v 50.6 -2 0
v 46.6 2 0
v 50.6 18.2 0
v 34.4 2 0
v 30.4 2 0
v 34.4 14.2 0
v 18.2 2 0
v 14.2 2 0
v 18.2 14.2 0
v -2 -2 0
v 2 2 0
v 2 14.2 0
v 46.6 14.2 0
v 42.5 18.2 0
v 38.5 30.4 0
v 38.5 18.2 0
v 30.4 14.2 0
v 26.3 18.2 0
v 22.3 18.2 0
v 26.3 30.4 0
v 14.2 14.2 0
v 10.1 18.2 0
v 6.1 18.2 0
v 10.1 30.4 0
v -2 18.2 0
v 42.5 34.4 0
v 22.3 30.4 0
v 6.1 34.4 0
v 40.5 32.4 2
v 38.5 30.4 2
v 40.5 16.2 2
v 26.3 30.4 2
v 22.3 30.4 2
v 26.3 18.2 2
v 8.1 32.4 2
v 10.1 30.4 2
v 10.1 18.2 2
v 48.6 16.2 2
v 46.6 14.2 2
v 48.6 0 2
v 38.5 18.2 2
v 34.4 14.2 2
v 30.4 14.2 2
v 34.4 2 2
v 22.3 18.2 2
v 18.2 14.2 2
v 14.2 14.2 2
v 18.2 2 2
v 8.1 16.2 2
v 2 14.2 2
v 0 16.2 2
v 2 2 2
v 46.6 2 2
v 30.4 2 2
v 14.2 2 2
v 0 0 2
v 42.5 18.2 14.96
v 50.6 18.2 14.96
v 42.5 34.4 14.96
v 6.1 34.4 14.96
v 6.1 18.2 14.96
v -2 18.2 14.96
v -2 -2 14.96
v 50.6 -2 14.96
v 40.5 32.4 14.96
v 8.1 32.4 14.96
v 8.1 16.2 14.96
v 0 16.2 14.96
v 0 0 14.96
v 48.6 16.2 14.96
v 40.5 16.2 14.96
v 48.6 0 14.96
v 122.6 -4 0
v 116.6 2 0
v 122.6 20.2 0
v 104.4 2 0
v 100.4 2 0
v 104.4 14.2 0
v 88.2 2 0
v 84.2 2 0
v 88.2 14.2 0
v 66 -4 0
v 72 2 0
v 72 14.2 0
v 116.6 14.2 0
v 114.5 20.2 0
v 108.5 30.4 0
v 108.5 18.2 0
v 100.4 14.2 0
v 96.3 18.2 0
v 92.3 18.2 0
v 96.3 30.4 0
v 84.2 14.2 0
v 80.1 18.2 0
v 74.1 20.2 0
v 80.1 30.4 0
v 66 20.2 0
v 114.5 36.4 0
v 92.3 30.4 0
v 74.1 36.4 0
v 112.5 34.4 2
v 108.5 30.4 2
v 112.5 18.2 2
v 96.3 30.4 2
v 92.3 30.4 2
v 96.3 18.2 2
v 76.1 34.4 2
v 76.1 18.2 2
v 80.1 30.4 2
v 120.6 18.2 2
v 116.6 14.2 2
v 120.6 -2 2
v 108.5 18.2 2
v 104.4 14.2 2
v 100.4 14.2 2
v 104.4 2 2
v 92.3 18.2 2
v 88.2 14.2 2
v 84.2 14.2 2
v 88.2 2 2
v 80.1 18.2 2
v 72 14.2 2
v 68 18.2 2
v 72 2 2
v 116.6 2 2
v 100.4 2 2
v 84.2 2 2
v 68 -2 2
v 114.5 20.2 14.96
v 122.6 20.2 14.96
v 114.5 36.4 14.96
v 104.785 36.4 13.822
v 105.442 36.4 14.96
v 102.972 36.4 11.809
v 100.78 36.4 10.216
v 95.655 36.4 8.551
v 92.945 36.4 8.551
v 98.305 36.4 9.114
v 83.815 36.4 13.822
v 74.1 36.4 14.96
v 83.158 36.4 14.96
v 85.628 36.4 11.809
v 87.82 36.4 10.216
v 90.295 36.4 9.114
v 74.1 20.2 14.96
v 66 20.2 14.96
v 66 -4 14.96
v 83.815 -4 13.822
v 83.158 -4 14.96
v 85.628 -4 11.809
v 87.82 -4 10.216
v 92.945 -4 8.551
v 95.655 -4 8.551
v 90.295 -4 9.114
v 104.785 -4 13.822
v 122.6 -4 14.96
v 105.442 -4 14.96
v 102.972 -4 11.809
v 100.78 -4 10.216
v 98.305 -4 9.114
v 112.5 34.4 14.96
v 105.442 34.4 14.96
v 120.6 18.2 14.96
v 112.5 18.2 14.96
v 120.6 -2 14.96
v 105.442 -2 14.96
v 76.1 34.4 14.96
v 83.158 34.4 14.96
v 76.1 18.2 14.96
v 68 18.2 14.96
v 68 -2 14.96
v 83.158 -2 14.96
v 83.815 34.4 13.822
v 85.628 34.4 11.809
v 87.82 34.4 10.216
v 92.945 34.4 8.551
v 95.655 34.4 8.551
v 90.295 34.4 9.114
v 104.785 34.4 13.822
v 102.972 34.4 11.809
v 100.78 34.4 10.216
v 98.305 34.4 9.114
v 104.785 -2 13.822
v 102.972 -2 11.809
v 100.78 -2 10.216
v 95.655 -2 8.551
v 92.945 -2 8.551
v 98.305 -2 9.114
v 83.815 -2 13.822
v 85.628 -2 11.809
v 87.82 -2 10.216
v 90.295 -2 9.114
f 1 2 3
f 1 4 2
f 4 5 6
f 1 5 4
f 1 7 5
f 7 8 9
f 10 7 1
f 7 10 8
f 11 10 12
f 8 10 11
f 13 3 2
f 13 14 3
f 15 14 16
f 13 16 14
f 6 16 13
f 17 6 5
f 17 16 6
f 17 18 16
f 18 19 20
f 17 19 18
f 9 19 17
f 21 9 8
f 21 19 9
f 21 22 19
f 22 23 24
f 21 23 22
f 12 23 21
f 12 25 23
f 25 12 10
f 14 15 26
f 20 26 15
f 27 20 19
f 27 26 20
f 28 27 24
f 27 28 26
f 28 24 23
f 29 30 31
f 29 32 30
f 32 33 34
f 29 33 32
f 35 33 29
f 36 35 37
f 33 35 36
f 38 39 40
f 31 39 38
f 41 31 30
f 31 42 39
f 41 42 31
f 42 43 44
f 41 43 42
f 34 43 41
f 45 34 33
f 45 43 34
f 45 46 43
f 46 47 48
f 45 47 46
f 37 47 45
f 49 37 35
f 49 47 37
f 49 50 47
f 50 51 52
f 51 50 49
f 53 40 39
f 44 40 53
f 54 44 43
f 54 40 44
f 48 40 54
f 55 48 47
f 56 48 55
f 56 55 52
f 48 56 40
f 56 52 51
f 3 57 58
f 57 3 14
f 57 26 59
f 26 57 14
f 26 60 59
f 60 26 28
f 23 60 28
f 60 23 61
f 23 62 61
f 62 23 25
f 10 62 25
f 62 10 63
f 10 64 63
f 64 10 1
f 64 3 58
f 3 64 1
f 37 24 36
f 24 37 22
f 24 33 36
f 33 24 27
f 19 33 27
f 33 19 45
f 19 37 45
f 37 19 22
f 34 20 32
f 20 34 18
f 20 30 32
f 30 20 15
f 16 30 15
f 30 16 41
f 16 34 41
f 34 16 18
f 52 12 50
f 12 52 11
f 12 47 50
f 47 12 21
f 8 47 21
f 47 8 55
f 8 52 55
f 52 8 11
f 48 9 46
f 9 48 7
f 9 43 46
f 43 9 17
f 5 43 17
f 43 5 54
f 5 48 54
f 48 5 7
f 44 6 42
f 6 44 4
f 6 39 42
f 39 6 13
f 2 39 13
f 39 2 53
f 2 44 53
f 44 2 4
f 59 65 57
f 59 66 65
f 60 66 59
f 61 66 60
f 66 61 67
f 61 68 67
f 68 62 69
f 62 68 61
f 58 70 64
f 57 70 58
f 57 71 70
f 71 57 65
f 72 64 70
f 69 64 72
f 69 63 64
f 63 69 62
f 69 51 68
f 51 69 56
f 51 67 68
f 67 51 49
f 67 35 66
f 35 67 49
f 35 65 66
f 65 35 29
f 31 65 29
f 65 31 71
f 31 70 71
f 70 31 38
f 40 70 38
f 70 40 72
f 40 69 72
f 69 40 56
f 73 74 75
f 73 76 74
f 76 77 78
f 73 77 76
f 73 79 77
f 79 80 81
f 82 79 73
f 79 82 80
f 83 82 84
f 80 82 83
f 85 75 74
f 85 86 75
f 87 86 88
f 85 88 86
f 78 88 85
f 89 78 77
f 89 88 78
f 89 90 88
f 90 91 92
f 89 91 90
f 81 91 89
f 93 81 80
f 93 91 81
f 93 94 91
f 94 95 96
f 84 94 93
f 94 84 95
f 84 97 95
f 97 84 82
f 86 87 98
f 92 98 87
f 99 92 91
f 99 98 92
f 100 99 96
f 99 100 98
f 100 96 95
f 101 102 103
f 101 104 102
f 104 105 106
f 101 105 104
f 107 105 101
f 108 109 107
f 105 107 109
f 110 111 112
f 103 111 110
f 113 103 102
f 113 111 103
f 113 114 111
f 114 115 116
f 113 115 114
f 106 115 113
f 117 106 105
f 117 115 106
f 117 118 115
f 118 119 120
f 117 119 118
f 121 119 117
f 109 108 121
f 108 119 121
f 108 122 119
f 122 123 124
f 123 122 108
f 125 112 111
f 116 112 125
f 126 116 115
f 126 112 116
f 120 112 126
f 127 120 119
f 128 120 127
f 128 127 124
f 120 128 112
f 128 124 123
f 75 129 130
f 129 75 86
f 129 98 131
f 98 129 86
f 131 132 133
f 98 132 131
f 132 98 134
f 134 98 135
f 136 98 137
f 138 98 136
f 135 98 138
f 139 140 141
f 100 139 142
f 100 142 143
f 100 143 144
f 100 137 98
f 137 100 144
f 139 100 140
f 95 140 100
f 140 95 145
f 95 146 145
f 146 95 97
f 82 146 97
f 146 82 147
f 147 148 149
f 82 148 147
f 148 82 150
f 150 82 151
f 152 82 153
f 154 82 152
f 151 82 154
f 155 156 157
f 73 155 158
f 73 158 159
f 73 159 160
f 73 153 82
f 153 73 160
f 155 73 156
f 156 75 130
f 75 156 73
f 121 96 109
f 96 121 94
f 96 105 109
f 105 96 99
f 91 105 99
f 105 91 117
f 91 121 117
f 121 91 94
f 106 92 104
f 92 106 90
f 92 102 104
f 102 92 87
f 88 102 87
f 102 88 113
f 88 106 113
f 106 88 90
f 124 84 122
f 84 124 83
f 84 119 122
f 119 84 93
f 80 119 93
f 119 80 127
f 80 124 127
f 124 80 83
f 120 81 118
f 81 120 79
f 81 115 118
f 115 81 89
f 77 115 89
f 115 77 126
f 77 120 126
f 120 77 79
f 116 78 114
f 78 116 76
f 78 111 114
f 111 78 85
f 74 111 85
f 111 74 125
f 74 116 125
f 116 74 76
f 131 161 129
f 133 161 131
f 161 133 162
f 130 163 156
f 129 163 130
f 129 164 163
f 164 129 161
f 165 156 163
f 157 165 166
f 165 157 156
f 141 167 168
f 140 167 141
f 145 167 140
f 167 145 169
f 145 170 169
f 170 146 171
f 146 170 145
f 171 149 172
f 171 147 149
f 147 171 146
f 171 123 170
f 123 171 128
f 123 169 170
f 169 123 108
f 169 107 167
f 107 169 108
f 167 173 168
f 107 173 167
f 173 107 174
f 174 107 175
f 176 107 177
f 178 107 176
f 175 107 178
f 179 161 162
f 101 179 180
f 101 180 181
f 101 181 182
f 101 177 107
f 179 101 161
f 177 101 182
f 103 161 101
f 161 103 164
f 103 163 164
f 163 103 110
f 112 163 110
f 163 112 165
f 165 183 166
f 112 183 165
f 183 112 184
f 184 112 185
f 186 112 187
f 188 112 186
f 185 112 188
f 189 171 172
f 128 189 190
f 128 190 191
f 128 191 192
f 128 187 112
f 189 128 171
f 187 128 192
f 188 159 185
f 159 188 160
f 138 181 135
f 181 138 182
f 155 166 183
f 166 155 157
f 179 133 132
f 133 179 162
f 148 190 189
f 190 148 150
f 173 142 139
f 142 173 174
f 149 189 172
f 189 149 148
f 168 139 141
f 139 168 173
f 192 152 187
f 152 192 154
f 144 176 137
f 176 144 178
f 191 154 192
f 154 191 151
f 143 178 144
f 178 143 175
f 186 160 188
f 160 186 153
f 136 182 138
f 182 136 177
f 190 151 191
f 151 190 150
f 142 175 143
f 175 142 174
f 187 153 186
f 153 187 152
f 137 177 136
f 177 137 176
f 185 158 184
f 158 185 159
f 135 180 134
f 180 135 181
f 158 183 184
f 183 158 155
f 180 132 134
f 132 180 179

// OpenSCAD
// file: diceware.scad
mm = 1;

die_width = 16.2 * mm;
wall_width = 2 * mm;
wall_height = 0.8 * die_width;
window_border = 2 * mm;

module clamshell()
{
    linear_extrude(wall_width) difference()
    {
        offset(delta = wall_width) children(0);
        if ($children > 1)
        {
            children(1);
        }
    }

    translate([ 0, 0, wall_width ]) linear_extrude(wall_height) difference()
    {
        offset(delta = wall_width) children(0);
        children(0);
    }
}

module window()
{
    offset(delta = -window_border) scale(die_width) polygon([ [ 0, 0 ], [ 1, 0 ], [ 1, 1 ], [ 0, 1 ] ]);
}

module diceware_bottom()
{
    clamshell()
    {
        // Base
        children(0);
        // Base Cutouts
        children(1);
    }
}

module diceware_top()
{
    difference()
    {
        clamshell()
        {
            // Base
            offset(delta = wall_width) children(0);

            // Base Cutouts
            children(1);
        }
        // Wall Cutouts
        children(2);
    }
}
// main file
include <diceware.scad>

module house_base()
{
    scale([ die_width, die_width ]) polygon([
        [ 0, 0 ],
        [ 3, 0 ],
        [ 3, 1 ],
        [ 2.5, 1 ],
        [ 2.5, 2 ],
        [ 0.5, 2 ],
        [ 0.5, 1 ],
        [ 0, 1 ],
    ]);
}

module house_windows()
{
    for (x = [ 0, 1, 2 ])
    {
        translate([ die_width * x, 0 ]) window();
    }
    for (x = [ 0, 1 ])
    {
        translate([ die_width * (x + 0.5), die_width ]) window();
    }
}

module house_bottom()
{
    diceware_bottom()
    {
        house_base();
        house_windows();
    }
}

module house_top()
{
    diceware_top()
    {
        house_base();
        house_windows();
        translate([ 1.5 * die_width, -2 * wall_width - 0.1 * mm, wall_width + wall_height * 1.5 ]) rotate([ -90, 0, 0 ])
            cylinder(r = wall_height, h = 2 * die_width + 4 * wall_width + 0.2 * mm);
    }
}

house_bottom();
translate([ 70, 0, 0 ]) house_top();
